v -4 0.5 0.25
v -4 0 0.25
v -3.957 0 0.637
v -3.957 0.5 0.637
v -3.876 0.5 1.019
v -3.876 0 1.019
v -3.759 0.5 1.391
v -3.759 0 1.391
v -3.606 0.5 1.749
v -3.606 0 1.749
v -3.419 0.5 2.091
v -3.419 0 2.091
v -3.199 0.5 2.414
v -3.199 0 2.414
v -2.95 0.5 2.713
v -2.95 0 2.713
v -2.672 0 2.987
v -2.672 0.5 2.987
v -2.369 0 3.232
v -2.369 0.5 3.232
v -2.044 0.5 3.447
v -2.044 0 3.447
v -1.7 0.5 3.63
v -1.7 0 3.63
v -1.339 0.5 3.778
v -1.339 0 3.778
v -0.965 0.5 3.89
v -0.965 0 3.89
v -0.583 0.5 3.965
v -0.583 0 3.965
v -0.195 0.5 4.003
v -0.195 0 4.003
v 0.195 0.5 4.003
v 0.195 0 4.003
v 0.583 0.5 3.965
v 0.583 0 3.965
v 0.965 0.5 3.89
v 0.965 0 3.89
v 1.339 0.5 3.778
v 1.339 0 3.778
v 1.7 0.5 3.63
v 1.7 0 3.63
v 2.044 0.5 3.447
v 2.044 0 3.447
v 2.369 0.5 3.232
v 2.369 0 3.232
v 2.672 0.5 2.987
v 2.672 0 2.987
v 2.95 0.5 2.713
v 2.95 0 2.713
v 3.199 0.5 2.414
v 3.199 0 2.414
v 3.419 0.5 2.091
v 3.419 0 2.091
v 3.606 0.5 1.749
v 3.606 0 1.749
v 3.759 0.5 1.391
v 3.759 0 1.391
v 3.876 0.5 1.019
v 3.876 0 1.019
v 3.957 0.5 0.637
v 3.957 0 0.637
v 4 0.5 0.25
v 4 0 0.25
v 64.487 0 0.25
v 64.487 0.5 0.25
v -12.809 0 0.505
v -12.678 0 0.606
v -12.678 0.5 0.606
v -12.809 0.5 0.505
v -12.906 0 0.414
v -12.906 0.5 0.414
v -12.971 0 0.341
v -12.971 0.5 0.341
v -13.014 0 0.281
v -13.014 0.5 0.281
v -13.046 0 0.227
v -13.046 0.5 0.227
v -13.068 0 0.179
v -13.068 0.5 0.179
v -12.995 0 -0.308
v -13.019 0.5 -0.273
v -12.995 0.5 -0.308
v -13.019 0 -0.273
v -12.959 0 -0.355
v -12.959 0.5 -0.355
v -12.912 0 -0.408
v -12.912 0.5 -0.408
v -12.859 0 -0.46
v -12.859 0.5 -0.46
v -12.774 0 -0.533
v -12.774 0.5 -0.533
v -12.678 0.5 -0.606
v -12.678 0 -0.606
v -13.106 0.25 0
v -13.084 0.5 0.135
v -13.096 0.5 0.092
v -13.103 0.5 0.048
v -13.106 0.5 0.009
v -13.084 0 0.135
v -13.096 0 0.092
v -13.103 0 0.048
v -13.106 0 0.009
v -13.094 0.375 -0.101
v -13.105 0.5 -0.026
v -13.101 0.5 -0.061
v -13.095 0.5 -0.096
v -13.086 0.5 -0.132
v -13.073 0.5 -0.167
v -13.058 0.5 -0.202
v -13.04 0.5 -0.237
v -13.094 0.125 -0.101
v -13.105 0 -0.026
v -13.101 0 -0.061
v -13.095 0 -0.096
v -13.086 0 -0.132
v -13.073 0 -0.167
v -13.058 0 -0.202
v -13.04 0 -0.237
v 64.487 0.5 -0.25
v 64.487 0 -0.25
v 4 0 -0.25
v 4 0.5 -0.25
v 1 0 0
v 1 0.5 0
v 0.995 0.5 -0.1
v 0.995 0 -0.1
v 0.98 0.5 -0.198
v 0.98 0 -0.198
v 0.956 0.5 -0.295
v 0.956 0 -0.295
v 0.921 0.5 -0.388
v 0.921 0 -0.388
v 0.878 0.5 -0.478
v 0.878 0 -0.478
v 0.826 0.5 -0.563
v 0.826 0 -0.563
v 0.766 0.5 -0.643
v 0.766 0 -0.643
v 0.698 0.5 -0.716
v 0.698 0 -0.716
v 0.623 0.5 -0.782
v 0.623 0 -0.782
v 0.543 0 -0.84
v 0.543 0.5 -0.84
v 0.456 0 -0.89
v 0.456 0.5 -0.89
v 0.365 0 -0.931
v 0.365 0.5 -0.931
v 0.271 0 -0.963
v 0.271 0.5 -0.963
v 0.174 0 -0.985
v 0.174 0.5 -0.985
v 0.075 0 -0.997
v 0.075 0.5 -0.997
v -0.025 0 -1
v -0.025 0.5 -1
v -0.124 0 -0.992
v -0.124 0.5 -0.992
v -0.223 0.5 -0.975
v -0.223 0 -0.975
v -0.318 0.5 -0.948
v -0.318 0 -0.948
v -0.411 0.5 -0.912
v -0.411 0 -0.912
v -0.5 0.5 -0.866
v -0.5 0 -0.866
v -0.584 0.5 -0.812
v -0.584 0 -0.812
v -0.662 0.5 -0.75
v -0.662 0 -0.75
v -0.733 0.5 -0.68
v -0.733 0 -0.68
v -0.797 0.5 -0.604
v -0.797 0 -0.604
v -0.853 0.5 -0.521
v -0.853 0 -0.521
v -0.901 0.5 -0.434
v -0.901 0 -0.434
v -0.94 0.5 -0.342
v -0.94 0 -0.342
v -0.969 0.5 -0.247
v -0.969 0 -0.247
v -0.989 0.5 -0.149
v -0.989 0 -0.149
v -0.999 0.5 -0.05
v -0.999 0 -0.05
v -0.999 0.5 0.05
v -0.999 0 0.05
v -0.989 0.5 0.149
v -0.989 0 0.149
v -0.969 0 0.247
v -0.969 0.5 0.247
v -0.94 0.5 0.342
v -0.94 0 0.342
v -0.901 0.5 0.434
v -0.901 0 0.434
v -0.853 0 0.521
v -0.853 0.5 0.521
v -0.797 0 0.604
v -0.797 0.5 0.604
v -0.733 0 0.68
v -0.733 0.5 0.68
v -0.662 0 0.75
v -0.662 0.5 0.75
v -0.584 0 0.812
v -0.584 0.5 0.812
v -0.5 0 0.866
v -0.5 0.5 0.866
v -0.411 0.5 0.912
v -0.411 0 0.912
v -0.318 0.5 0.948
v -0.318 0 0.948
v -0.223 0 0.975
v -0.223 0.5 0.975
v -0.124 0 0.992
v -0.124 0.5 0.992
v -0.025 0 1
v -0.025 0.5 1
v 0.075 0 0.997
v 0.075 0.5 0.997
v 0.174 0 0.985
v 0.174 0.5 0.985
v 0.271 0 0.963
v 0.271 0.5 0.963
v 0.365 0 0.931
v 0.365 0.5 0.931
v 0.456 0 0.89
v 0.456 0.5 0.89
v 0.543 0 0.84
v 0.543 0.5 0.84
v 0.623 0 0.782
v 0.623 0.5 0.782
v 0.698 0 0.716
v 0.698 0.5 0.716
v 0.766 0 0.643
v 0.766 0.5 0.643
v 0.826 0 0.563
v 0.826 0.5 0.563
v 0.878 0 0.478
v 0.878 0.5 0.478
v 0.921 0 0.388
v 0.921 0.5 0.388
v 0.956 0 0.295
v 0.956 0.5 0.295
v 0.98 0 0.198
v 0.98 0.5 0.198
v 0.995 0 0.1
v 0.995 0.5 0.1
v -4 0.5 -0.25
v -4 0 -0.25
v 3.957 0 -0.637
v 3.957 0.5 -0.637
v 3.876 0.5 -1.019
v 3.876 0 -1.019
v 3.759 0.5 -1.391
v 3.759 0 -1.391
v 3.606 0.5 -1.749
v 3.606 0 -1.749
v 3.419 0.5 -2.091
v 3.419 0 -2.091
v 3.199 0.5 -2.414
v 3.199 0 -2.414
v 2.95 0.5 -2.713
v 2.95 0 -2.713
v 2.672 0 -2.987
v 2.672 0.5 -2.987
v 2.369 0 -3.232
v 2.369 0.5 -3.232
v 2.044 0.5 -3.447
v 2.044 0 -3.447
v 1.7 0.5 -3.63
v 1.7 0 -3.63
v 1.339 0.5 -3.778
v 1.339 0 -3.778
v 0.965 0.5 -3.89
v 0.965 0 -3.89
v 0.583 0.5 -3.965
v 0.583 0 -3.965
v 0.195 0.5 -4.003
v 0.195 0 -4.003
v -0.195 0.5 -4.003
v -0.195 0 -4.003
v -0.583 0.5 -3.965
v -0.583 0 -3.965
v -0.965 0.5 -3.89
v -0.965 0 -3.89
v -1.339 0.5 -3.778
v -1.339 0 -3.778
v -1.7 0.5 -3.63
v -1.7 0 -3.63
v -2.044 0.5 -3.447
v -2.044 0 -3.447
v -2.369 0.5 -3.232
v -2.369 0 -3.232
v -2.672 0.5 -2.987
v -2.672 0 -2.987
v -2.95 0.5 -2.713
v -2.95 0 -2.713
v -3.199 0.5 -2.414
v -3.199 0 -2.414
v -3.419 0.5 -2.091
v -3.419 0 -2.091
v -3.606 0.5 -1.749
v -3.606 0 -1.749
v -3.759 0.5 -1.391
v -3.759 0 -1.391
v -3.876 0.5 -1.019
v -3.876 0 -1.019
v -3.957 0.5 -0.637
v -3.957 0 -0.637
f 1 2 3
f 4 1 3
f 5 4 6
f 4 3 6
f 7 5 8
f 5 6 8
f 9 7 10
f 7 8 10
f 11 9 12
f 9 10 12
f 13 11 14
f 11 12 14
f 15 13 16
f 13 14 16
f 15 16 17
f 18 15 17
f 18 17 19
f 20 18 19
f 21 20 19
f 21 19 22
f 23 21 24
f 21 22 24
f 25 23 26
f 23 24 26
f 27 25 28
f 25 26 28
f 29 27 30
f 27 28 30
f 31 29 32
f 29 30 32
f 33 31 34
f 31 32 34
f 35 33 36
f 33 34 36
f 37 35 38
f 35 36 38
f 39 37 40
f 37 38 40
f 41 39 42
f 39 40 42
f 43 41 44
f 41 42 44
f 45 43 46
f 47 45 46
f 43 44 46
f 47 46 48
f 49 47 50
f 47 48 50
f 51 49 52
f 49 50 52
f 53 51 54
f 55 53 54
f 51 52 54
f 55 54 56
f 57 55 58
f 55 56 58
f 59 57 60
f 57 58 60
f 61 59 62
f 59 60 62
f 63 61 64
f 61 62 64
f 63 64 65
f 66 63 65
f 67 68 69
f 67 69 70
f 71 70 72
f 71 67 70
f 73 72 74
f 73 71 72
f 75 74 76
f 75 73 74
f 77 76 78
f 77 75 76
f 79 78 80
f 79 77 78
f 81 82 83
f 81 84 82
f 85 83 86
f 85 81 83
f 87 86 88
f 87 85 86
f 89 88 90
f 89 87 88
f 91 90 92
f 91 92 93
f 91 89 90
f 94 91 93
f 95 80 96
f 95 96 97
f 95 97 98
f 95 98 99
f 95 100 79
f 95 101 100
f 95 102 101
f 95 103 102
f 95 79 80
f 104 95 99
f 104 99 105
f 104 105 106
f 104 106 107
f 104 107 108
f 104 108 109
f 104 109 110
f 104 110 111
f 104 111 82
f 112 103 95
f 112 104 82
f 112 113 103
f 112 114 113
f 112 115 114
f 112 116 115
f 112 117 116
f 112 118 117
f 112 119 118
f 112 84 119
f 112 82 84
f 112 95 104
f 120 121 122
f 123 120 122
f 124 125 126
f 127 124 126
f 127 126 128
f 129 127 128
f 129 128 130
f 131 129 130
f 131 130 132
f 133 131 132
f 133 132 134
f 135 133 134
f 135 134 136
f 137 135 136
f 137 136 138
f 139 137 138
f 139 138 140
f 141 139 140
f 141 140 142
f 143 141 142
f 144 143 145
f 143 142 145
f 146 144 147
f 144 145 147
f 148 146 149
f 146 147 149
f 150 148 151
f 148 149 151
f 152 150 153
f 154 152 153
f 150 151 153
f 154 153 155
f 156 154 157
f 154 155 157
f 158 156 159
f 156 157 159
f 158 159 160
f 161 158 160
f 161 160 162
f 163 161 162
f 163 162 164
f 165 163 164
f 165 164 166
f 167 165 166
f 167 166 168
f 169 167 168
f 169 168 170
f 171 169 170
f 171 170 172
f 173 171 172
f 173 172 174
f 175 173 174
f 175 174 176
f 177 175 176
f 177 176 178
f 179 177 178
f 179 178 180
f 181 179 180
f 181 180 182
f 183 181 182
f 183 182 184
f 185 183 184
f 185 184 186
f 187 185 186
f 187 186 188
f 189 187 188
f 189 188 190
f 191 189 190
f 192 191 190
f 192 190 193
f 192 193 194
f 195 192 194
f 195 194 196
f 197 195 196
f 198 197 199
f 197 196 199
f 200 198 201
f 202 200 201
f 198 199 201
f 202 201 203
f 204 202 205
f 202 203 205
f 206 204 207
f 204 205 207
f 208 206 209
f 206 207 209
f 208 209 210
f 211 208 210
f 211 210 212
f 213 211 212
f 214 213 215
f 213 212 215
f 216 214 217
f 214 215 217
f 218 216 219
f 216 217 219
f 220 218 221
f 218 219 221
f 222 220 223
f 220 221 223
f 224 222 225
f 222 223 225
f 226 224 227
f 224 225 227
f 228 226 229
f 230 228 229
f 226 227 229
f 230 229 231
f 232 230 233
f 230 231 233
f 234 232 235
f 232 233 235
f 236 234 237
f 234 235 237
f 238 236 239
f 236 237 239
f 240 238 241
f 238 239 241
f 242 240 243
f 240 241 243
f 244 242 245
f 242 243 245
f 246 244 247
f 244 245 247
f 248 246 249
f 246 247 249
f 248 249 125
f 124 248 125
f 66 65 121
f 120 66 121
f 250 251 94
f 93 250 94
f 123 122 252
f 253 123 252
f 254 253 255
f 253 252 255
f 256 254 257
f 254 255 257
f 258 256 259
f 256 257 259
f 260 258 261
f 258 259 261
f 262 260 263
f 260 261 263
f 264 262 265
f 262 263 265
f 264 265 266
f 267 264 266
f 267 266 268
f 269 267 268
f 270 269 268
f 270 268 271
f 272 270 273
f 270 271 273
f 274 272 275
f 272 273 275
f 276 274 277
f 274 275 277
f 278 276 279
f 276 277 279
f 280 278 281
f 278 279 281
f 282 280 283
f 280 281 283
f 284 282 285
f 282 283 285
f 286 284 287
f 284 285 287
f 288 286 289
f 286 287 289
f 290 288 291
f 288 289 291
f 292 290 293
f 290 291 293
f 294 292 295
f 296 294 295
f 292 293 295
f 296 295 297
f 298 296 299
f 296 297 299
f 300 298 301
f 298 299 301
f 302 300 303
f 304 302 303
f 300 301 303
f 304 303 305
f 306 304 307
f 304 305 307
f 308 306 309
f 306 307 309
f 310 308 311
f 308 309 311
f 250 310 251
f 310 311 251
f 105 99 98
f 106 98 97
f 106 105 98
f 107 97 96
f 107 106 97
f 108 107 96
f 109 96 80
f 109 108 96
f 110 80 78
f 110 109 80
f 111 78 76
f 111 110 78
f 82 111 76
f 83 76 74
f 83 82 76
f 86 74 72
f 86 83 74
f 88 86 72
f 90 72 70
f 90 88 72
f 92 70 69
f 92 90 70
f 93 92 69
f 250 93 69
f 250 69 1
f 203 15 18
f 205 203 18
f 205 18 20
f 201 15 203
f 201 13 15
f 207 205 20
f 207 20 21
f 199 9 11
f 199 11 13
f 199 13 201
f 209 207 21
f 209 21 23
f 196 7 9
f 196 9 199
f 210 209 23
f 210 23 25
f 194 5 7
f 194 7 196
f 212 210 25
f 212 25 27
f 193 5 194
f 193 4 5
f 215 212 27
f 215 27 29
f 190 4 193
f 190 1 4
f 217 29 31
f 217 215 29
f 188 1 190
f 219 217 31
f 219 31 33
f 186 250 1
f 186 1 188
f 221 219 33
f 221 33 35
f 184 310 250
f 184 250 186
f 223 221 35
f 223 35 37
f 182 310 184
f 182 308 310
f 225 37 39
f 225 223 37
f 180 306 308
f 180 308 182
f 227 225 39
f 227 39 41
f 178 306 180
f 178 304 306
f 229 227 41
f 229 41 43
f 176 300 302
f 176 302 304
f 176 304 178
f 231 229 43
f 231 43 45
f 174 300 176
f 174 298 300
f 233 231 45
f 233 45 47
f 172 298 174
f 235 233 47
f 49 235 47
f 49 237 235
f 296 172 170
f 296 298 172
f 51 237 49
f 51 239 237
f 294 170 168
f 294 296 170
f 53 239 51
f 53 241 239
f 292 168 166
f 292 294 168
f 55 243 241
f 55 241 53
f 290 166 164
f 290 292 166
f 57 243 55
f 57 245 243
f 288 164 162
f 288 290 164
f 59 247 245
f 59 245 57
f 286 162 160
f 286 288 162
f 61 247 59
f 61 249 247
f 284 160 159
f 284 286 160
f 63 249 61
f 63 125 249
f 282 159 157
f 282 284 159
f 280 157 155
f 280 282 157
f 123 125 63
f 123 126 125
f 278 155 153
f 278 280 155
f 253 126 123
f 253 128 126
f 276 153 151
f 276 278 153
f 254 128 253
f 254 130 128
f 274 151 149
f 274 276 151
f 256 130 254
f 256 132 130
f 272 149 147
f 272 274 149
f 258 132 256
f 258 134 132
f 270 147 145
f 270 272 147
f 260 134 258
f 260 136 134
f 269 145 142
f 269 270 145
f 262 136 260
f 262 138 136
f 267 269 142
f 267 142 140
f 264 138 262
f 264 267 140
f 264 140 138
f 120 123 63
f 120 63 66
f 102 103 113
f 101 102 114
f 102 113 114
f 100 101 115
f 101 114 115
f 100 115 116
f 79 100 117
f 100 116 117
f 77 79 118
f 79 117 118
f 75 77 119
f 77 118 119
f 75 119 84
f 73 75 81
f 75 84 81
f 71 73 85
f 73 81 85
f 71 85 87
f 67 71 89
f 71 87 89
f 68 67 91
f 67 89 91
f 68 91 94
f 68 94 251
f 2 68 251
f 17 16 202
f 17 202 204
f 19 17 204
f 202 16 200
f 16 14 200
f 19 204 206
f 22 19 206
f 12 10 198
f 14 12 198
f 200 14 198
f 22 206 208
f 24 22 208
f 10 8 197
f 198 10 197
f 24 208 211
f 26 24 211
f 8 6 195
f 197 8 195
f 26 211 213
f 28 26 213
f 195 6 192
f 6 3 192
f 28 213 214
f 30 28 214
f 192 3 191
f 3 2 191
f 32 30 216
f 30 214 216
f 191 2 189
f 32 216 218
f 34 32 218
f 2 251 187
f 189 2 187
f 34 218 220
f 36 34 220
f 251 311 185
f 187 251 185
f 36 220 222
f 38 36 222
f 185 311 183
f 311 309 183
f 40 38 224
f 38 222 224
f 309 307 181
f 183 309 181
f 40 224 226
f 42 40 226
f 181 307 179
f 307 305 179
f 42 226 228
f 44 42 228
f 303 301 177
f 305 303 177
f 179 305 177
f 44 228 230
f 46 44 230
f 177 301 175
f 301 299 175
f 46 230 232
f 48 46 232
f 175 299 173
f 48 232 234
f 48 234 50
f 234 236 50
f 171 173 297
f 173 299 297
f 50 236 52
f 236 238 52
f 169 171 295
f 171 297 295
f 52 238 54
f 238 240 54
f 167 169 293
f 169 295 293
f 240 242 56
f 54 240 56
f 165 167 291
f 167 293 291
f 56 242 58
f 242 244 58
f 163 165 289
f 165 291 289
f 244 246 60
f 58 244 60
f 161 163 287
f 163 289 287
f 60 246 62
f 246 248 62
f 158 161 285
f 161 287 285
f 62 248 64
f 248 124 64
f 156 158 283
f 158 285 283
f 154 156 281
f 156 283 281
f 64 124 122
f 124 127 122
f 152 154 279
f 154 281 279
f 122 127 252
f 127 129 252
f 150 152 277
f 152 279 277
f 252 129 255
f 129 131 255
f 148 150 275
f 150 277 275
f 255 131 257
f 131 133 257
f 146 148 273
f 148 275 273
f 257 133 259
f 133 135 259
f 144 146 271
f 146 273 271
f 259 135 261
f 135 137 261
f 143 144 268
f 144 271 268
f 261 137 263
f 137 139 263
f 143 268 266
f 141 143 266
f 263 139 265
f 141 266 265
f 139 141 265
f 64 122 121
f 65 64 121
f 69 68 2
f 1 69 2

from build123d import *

# Parameters (mm, degrees)
BOSS_EXTRUDE2_DEPTH = 0.5
SKETCH3_R           = 1
CUT_EXTRUDE2_DEPTH  = 1.5000001


with BuildPart() as part:
    # Sketch1 → Boss-Extrude2 (new body)
    with BuildSketch(Plane(origin=(0, 0, 0), x_dir=(1, 0, 0), z_dir=(0, 1, 0))):
        with BuildLine():
            Line((64.487313154, 0.25), (4, 0.25))
            ThreePointArc((4, 0.25), (0, 4.007804885), (-4, 0.25))
            Line((-4, 0.25), (-12.67773598, 0.606260641))
            add(Edge.make_bspline(
                [(-12.67773598, -0.606260641), (-13.533789945, 0), (-12.67773598, 0.606260641)],
                knots=[0, 0, 0, 1, 1, 1], degree=2))
            Line((-12.67773598, -0.606260641), (-4, -0.25))
            ThreePointArc((-4, -0.25), (0, -4.007804885), (4, -0.25))
            Line((4, -0.25), (64.487313154, -0.25))
            Line((64.487313154, -0.25), (64.487313154, 0.25))
        make_face()
    extrude(amount=BOSS_EXTRUDE2_DEPTH)

    # Sketch3 → Cut-Extrude2 (cut, through all)
    with BuildSketch(Plane(origin=(0, 0.5, 0), x_dir=(1, 0, 0), z_dir=(0, 1, 0))):
        Circle(SKETCH3_R)
    extrude(amount=-CUT_EXTRUDE2_DEPTH, mode=Mode.SUBTRACT)


solid = part.part
